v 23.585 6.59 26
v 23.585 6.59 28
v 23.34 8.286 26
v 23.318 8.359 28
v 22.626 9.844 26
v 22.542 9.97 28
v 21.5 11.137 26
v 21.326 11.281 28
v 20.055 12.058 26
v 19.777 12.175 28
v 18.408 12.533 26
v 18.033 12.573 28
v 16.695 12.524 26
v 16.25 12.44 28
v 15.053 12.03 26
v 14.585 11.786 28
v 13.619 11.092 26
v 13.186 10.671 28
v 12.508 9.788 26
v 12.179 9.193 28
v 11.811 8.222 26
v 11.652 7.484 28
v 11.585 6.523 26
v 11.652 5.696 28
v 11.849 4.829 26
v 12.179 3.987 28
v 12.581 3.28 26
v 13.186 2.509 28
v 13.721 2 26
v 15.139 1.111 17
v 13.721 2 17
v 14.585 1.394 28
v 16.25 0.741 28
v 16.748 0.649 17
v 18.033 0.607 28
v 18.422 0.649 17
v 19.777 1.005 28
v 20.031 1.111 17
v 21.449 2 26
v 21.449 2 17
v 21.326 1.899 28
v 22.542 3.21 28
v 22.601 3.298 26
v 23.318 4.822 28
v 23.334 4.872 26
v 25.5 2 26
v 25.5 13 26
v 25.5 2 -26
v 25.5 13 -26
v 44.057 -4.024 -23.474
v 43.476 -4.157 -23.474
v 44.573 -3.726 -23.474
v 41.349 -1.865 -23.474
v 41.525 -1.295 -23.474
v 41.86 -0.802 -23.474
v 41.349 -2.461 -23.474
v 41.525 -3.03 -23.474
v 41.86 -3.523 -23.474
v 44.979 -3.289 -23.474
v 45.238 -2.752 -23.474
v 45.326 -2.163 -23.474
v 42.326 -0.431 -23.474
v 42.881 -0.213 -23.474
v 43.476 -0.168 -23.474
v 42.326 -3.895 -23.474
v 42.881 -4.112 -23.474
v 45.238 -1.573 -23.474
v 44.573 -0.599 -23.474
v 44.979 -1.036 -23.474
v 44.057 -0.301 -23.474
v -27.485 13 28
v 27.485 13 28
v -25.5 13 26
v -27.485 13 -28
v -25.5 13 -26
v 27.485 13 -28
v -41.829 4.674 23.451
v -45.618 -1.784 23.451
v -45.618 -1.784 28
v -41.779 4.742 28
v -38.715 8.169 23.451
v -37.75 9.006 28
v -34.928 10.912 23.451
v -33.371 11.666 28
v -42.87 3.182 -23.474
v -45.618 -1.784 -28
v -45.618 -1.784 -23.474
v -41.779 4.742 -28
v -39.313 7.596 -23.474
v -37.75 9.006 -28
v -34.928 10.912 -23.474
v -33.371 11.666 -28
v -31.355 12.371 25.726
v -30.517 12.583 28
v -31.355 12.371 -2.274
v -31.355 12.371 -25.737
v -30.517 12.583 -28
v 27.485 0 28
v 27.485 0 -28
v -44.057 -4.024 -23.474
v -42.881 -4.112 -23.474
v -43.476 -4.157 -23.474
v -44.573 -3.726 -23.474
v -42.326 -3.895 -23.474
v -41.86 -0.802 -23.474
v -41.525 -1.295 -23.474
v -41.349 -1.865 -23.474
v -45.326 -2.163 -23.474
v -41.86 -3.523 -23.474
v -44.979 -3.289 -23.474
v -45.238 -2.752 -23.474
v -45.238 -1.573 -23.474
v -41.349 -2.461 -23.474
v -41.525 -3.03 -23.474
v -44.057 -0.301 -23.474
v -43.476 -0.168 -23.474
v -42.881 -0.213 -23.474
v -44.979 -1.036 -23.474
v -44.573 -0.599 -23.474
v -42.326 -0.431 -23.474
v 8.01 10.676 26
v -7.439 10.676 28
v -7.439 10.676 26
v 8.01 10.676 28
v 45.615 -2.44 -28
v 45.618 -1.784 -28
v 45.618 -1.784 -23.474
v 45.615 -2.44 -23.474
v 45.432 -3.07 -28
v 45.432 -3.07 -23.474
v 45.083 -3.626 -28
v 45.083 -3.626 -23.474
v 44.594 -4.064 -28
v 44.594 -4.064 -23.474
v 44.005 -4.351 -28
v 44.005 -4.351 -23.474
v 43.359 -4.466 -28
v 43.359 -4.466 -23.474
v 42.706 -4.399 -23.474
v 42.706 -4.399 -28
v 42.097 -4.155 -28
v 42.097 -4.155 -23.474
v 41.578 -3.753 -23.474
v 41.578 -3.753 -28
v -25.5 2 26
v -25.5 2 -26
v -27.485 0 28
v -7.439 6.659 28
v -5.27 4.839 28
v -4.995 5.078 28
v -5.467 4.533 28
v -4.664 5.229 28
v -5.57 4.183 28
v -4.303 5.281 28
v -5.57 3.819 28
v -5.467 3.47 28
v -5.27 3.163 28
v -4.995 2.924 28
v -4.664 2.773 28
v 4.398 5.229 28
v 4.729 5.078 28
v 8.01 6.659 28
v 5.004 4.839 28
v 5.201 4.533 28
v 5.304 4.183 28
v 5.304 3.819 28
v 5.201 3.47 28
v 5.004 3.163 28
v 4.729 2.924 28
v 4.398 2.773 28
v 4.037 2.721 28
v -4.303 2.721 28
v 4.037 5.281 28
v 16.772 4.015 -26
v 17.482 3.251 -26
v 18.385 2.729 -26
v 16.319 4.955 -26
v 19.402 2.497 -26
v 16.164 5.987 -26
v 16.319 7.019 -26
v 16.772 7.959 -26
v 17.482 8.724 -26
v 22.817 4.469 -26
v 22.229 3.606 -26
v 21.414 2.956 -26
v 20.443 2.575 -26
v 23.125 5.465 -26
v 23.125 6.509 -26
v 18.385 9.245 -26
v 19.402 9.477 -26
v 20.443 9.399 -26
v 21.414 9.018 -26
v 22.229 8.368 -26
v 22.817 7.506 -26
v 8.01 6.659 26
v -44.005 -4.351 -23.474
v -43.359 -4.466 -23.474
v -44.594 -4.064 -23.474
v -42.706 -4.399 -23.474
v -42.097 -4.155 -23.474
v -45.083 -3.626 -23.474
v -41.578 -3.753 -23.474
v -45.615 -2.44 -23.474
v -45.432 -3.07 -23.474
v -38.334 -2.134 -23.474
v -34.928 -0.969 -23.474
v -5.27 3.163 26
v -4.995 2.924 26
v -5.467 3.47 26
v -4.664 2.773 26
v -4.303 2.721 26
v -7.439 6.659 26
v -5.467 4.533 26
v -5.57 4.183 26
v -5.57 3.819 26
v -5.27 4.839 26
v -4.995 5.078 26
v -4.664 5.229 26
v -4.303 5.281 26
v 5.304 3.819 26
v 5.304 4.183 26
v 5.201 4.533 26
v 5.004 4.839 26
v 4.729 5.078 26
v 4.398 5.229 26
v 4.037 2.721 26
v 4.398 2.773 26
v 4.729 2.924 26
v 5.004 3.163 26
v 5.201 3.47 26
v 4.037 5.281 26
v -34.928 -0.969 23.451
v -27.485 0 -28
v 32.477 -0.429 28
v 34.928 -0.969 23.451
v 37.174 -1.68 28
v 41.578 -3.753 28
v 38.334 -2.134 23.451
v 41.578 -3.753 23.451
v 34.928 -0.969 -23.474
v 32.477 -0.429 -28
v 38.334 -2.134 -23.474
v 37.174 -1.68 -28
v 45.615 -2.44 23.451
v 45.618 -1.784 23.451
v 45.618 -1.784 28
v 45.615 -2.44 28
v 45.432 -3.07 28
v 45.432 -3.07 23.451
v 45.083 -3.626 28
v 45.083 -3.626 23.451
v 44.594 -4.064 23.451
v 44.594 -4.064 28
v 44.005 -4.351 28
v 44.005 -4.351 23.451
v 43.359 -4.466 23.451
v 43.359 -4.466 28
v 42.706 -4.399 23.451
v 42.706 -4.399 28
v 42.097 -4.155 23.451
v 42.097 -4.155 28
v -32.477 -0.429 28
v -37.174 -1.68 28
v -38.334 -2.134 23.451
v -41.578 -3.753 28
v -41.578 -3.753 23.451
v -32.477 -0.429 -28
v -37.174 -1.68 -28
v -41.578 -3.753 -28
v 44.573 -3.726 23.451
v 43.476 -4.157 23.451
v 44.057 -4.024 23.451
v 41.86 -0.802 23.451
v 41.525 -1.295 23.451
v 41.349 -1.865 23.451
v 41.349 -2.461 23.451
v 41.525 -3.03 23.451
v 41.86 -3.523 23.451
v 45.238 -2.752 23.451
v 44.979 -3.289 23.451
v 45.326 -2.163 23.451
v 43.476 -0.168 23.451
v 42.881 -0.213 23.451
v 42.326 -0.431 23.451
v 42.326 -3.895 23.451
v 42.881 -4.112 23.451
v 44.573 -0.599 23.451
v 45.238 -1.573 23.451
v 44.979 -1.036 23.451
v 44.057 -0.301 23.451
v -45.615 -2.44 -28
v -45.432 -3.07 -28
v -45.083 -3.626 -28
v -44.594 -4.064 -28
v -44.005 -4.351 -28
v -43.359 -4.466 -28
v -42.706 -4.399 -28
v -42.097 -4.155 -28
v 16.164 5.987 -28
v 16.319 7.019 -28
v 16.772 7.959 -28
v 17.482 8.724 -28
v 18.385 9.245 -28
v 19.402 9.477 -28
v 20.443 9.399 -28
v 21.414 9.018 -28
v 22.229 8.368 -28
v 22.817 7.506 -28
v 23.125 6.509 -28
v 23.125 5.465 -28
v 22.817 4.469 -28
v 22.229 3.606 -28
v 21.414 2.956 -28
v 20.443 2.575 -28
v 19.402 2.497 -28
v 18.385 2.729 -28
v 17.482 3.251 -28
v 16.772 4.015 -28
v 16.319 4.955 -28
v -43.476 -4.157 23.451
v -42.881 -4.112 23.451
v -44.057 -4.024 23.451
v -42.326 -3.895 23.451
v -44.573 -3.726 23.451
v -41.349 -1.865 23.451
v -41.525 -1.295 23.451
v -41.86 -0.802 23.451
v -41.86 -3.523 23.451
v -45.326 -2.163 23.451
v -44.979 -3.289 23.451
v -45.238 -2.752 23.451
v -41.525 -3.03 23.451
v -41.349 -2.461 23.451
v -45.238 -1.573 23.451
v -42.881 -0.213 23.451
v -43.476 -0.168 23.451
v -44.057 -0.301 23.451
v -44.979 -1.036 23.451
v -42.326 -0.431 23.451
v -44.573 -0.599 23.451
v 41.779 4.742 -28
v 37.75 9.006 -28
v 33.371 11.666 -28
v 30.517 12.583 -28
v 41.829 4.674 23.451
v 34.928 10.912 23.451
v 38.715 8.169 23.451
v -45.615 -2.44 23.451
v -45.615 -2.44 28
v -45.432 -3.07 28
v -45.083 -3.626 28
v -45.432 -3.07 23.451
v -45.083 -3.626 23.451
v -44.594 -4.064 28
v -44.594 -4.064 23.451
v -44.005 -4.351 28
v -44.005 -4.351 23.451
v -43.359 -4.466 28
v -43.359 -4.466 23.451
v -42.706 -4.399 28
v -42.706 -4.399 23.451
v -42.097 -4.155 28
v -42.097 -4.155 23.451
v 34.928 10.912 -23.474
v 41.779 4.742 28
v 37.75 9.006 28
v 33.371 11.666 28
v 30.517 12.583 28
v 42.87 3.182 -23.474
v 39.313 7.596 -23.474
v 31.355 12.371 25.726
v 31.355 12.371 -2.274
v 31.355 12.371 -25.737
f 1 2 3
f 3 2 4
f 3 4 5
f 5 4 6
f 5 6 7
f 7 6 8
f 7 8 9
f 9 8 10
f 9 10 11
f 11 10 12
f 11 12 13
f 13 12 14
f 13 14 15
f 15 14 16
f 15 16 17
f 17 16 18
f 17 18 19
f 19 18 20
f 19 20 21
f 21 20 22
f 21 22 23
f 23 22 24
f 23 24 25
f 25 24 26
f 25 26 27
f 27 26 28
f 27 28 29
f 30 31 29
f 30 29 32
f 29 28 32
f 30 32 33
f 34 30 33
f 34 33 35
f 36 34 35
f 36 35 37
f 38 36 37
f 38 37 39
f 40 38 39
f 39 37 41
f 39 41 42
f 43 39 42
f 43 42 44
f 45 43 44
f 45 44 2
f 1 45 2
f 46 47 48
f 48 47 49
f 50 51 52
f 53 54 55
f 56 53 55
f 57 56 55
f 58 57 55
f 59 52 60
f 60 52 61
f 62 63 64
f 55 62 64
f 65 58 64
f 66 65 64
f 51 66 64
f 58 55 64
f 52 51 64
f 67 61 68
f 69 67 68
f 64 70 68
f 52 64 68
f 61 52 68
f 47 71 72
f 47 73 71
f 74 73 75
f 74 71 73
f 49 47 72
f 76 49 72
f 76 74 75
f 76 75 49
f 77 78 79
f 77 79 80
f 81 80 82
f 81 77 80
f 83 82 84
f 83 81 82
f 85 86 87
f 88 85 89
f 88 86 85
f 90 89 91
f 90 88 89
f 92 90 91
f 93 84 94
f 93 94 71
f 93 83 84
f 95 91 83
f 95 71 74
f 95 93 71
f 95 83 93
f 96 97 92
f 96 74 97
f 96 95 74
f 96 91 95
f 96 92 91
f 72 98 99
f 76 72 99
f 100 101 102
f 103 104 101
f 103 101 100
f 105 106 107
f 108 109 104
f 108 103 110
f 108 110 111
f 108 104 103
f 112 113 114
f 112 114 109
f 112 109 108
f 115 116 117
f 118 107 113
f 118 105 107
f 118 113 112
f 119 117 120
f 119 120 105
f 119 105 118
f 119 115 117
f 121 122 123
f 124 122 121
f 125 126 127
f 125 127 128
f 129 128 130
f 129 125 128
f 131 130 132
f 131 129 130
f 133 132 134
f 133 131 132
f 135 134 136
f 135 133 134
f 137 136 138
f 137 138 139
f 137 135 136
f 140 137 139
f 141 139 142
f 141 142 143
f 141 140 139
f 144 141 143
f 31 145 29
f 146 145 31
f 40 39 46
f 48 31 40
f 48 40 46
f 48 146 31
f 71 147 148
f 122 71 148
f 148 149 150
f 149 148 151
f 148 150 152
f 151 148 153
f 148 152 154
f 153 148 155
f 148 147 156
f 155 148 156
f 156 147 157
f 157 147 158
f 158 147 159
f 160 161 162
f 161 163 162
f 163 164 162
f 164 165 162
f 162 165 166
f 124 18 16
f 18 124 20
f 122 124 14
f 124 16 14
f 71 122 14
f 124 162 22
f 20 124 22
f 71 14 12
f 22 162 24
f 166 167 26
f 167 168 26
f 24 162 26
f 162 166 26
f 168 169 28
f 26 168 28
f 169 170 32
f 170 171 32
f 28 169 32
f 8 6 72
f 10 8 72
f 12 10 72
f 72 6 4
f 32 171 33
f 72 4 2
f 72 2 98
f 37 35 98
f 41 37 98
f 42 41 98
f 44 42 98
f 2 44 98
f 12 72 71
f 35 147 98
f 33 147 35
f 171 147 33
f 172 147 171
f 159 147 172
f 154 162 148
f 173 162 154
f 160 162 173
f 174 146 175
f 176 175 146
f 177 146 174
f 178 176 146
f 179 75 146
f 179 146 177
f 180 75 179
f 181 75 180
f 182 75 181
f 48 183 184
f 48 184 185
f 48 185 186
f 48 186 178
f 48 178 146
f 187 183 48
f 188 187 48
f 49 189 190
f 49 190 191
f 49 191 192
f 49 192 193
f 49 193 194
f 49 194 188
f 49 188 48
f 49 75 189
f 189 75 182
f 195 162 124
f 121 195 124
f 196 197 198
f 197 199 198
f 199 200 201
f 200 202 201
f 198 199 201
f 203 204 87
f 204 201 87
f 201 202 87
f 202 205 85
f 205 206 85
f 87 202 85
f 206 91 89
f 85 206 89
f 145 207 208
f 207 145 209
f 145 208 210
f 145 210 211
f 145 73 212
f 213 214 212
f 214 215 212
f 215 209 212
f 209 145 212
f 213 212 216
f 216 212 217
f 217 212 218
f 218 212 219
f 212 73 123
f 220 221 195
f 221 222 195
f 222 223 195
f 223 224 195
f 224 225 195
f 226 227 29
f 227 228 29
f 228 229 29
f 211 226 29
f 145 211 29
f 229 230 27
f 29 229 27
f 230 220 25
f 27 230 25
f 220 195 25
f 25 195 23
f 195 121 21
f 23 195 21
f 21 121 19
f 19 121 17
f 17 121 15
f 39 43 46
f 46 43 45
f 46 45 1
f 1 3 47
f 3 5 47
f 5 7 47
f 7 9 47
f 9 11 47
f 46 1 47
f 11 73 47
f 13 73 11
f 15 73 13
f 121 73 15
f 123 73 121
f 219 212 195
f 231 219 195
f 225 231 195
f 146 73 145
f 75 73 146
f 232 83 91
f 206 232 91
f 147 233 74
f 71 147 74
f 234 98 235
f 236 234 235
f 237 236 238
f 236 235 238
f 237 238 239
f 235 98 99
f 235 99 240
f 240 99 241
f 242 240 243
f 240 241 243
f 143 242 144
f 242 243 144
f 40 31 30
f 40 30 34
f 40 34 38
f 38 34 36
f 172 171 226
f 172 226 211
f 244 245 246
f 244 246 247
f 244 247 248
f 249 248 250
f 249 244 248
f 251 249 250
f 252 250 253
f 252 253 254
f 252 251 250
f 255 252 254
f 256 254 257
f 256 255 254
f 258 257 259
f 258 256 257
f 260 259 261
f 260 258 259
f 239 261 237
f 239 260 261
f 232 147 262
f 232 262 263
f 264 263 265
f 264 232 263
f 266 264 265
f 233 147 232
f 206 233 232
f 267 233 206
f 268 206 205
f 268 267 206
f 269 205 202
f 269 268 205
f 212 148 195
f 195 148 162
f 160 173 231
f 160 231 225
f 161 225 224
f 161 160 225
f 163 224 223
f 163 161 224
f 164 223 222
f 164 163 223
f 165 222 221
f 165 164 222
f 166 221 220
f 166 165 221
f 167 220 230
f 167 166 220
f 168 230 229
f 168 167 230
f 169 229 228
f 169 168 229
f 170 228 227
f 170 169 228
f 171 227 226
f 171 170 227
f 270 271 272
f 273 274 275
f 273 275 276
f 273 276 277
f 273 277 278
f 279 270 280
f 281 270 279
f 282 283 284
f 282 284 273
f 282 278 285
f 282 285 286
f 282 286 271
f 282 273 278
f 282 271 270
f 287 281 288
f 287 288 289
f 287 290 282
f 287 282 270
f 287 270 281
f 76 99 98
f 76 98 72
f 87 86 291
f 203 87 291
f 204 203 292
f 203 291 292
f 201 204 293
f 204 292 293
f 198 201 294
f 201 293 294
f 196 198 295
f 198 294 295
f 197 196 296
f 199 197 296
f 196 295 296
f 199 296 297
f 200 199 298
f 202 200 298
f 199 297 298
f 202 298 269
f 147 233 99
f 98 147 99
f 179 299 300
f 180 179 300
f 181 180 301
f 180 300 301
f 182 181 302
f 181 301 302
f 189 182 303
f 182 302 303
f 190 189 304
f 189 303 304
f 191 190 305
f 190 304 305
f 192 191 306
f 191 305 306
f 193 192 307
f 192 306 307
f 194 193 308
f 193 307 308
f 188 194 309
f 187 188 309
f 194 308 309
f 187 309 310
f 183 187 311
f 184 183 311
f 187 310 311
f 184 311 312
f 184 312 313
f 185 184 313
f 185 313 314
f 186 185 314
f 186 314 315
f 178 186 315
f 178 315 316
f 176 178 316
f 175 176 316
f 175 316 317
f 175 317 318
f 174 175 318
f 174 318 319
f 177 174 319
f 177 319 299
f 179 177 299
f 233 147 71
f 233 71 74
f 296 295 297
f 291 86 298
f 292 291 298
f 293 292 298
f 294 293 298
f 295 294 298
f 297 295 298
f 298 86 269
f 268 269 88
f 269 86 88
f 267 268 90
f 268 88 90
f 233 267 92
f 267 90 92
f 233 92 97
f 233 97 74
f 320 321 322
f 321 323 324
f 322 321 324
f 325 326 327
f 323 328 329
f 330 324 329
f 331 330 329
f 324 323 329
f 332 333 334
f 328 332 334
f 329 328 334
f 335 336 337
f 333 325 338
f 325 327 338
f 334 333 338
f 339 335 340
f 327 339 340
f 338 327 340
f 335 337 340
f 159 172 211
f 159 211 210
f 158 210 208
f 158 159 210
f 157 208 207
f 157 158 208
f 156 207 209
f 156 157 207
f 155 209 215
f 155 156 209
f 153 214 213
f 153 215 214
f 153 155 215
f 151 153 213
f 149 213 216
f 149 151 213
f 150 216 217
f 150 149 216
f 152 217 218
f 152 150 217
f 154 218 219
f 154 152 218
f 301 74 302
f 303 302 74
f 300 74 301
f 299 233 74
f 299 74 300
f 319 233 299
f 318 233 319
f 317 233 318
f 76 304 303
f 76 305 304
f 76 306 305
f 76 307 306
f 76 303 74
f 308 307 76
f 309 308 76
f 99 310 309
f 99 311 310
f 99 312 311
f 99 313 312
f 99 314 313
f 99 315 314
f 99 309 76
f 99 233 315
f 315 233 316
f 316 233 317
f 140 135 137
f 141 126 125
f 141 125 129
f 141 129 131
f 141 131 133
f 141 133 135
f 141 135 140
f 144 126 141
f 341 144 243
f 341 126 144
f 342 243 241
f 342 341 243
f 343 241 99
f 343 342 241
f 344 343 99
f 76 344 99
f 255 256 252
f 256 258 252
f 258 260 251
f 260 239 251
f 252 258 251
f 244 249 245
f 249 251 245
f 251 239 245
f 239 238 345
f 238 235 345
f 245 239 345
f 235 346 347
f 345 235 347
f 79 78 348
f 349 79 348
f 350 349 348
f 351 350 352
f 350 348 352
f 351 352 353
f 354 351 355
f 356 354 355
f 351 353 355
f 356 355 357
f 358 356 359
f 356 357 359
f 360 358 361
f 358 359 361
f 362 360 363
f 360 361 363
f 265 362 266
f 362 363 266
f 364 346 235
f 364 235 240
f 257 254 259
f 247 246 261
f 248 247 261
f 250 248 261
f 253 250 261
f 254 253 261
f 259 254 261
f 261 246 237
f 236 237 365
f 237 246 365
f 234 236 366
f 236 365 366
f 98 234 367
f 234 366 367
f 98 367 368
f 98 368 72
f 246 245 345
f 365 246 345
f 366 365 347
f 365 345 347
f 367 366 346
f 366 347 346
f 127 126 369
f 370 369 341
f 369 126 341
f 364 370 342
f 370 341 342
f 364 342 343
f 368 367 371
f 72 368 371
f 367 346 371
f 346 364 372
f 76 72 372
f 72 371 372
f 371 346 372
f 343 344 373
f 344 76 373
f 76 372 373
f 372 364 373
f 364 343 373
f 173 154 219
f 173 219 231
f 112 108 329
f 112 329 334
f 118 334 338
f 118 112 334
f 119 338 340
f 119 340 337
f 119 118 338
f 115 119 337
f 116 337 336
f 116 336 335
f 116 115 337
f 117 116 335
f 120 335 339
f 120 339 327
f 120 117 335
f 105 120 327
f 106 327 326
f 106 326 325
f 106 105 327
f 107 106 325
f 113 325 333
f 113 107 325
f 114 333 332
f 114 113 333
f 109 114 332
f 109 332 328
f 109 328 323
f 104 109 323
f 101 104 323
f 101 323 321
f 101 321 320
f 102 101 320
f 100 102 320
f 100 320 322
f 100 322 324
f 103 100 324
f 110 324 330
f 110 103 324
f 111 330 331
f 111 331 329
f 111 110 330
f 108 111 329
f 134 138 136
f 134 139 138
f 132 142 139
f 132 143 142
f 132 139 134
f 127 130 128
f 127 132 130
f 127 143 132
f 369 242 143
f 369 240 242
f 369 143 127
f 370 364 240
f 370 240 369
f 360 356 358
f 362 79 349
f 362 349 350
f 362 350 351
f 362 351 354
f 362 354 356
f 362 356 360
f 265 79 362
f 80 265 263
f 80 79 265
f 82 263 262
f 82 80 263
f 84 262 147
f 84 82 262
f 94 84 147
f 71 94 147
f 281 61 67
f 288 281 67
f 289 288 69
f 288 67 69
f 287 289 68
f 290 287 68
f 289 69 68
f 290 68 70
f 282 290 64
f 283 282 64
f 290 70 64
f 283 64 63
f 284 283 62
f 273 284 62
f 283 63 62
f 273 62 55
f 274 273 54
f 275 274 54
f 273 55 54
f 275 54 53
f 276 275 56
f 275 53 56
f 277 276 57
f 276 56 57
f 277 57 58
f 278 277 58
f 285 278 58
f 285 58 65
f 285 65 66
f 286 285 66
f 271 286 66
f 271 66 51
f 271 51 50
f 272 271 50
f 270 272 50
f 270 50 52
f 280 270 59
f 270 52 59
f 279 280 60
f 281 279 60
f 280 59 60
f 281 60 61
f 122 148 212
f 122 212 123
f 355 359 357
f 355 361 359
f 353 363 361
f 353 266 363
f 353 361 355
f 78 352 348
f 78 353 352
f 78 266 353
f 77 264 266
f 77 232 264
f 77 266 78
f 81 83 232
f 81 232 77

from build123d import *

# Parameters (mm, degrees)
SKETCH1_W               = 54.97
SKETCH1_H               = 56
BOSS_EXTRUDE1_DEPTH     = 13
SKETCH2_W               = 51
SKETCH2_H               = 52
CUT_EXTRUDE1_DEPTH      = 11
SKETCH3_R               = 6
CUT_EXTRUDE2_DEPTH      = 11
SKETCH4_W               = 15.449301527
SKETCH4_H               = 4.016818397
CUT_EXTRUDE3_DEPTH      = 11
SKETCH5_R               = 3.5
CUT_EXTRUDE4_DEPTH      = 11
BOSS_EXTRUDE2_DEPTH     = 56
SKETCH7_W               = 11.055643201
SKETCH7_H               = 46.925063364
CUT_EXTRUDE5_DEPTH      = 11
CUT_EXTRUDE5_DEPTH_BACK = 11
SKETCH8_R               = 2
BOSS_EXTRUDE3_DEPTH     = 46.925063


with BuildPart() as part:
    # Sketch1 → Boss-Extrude1 (new body)
    with BuildSketch(Plane(origin=(0, 0, 0), x_dir=(1, 0, 0), z_dir=(0, 1, 0))):
        Rectangle(SKETCH1_W, SKETCH1_H)
    extrude(amount=BOSS_EXTRUDE1_DEPTH)

    # Sketch2 → Cut-Extrude1 (cut)
    with BuildSketch(Plane(origin=(0, 13, 0), x_dir=(1, 0, 0), z_dir=(0, 1, 0))):
        Rectangle(SKETCH2_W, SKETCH2_H)
    extrude(amount=-CUT_EXTRUDE1_DEPTH, mode=Mode.SUBTRACT)

    # Sketch3 → Cut-Extrude2 (cut)
    with BuildSketch(Plane.XY.offset(28)):
        with Locations((17.58480672, 6.590072484)):
            Circle(SKETCH3_R)
        with BuildLine():
            Line((4.037012251, 2.721252654), (-4.302987749, 2.721252654))
            ThreePointArc((-4.302987749, 2.721252654), (-5.582987749, 4.001252654), (-4.302987749, 5.281252654))
            Line((-4.302987749, 5.281252654), (4.037012251, 5.281252654))
            ThreePointArc((4.037012251, 5.281252654), (5.317012251, 4.001252654), (4.037012251, 2.721252654))
        make_face()
    extrude(amount=-CUT_EXTRUDE2_DEPTH, mode=Mode.SUBTRACT)

    # Sketch4 → Cut-Extrude3 (cut)
    with BuildSketch(Plane.XY.offset(28)):
        with Locations((0.285779877, 8.667738861)):
            Rectangle(SKETCH4_W, SKETCH4_H)
    extrude(amount=-CUT_EXTRUDE3_DEPTH, mode=Mode.SUBTRACT)

    # Sketch5 → Cut-Extrude4 (cut)
    with BuildSketch(Plane(origin=(0, 0, -28), x_dir=(-1, 0, 0), z_dir=(0, 0, -1))):
        with Locations((-19.663814967, 5.987097456)):
            Circle(SKETCH5_R)
    extrude(amount=-CUT_EXTRUDE4_DEPTH, mode=Mode.SUBTRACT)


with BuildPart() as body_2:
    # Sketch6 → Boss-Extrude2 (new body)
    with BuildSketch(Plane(origin=(0, 0, -28), x_dir=(-1, 0, 0), z_dir=(0, 0, -1))):
        with BuildLine():
            Line((-27.485, 0), (-27.485, 13))
            add(Edge.make_bspline(
                [(-45.618050055, -1.78397783), (-38.965723797, 12.38963767), (-27.485, 13)],
                knots=[0, 0, 0, 0.917429215, 0.917429215, 0.917429215], degree=2))
            ThreePointArc((-45.618050055, -1.78397783), (-44.30948041, -4.228252554), (-41.578017137, -3.75291917))
            add(Edge.make_bspline(
                [(-27.485, 0), (-35.193013177, -0.027010038), (-41.578017137, -3.75291917)],
                knots=[0, 0, 0, 1, 1, 1], degree=2))
        make_face()
    extrude(amount=-BOSS_EXTRUDE2_DEPTH)

    # Sketch7 → Cut-Extrude5 (cut, two sides)
    with BuildSketch(Plane(origin=(0, 0, 0), x_dir=(1, 0, 0), z_dir=(0, 1, 0))) as cut_extrude5_sk:
        with Locations((40.45624055, 0.011076051)):
            Rectangle(SKETCH7_W, SKETCH7_H)
    extrude(amount=CUT_EXTRUDE5_DEPTH, mode=Mode.SUBTRACT)
    extrude(cut_extrude5_sk.sketch, amount=-CUT_EXTRUDE5_DEPTH_BACK, mode=Mode.SUBTRACT)


with BuildPart() as body_3:
    # Sketch8 → Boss-Extrude3 (new body)
    with BuildSketch(Plane.XY.offset(-23.473607733)):
        with Locations((43.326467318, -2.162635088)):
            Circle(SKETCH8_R)
    extrude(amount=BOSS_EXTRUDE3_DEPTH)


with BuildPart() as body_4:
    # Mirror2: mirrored copy
    add(body_2.part.mirror(Plane(origin=(0, 0, 0), x_dir=(0, 0, 1), z_dir=(1, 0, 0))))


with BuildPart() as body_5:
    # Mirror2 2: mirrored copy
    add(body_3.part.mirror(Plane(origin=(0, 0, 0), x_dir=(0, 0, 1), z_dir=(1, 0, 0))))


solid = Compound([part.part, body_2.part, body_3.part, body_4.part, body_5.part])
